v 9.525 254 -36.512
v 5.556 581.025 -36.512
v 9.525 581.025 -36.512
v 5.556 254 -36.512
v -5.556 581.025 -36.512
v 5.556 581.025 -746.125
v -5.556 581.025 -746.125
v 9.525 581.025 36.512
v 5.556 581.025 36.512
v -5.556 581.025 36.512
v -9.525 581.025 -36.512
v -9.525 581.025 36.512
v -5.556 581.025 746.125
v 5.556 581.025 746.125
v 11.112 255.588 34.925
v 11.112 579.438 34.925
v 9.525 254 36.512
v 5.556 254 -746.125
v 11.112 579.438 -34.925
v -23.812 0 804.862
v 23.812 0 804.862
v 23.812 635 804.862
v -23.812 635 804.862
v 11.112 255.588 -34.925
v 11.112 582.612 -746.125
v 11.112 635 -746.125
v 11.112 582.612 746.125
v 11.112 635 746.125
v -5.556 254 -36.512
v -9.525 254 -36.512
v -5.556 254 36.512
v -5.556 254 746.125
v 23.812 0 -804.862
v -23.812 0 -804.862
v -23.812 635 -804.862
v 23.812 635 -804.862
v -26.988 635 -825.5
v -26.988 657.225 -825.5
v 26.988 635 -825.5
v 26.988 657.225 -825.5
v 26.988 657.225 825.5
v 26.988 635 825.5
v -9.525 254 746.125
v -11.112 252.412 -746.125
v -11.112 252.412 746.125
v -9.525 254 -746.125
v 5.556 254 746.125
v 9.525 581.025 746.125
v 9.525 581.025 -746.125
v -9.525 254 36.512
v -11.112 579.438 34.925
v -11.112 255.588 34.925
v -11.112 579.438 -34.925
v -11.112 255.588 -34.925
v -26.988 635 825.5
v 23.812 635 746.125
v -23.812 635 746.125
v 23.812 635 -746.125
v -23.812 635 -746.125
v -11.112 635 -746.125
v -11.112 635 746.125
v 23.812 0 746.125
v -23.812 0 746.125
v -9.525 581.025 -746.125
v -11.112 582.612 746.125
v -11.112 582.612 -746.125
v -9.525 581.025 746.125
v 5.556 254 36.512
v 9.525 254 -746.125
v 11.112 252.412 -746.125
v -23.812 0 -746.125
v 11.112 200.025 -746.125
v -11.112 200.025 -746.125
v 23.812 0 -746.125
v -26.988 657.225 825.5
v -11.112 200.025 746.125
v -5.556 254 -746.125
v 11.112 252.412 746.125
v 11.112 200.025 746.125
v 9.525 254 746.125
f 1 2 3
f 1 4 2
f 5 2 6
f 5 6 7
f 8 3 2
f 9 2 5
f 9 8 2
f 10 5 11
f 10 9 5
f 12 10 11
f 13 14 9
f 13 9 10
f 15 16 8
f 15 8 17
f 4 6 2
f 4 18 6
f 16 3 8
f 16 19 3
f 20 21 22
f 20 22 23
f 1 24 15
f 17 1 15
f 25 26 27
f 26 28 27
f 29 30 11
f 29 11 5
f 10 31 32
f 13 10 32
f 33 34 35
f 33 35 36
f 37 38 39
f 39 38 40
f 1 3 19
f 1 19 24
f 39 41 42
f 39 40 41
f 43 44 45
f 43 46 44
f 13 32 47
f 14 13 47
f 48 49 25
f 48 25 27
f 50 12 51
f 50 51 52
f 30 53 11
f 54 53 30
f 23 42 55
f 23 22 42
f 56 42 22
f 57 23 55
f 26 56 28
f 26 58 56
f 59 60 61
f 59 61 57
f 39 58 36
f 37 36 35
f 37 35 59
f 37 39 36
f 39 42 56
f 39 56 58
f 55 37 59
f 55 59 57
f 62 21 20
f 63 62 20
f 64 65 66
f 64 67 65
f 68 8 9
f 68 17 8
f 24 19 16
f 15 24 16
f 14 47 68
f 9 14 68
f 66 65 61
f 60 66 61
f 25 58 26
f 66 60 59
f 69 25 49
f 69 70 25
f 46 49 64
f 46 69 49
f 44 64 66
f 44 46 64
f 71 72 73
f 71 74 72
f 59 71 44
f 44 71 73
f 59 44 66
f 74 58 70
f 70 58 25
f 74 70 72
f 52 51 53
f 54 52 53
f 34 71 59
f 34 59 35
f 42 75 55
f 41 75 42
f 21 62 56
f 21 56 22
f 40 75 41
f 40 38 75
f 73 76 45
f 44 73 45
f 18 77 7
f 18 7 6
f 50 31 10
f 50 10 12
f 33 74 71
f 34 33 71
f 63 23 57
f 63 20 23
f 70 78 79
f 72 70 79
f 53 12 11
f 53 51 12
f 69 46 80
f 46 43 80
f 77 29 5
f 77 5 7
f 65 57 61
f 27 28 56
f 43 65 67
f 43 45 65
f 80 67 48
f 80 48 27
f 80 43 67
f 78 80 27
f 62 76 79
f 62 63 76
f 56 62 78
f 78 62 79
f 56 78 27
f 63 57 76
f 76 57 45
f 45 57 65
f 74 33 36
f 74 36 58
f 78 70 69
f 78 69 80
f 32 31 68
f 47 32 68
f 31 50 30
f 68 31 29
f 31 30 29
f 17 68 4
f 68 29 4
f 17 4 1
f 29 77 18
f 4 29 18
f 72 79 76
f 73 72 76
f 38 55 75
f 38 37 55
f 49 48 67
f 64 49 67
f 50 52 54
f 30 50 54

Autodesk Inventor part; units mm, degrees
ref_plane "YZ Plane" through (0, 0, 0) normal (1, 0, 0) x (0, 1, 0)
ref_plane "XZ Plane" through (0, 0, 0) normal (0, 1, 0) x (-1, 0, 0)
ref_plane "XY Plane" through (0, 0, 0) normal (0, 0, 1) x (1, 0, 0)
sketch "Sketch1" plane through (0, 0, 0) normal (0, 1, 0) x (-1, 0, 0)
  line L0 (-23.8125, 804.8625) -> (23.8125, 804.8625)
  line L1 (23.8125, 804.8625) -> (23.8125, 746.125)
  line L2 (23.8125, 746.125) -> (-23.8125, 746.125)
  line L3 (-23.8125, 746.125) -> (-23.8125, 804.8625)
  line L4 (-23.8125, 804.8625) -> (23.8125, 746.125) construction
  line L5 (23.8125, 804.8625) -> (-23.8125, 746.125) construction
  line L6 (-23.8125, -746.125) -> (23.8125, -746.125)
  line L7 (23.8125, -746.125) -> (23.8125, -804.8625)
  line L8 (23.8125, -804.8625) -> (-23.8125, -804.8625)
  line L9 (-23.8125, -804.8625) -> (-23.8125, -746.125)
  line L10 (-23.8125, -746.125) -> (23.8125, -804.8625) construction
  line L11 (23.8125, -746.125) -> (-23.8125, -804.8625) construction
  line L12 (0, 746.125) -> (0, 0) construction
  line L13 (0, 0) -> (0, -746.125) construction
  point P0 (0, 775.4938)
  point P1 (0, -775.4938)
  point P2 (0, 775.4938)
  point P3 (0, -775.4938)
  dimension "d0" = 47.625
  dimension "d1" = 58.7375
  dimension "d2" = 1609.725
extrude "Extrusion1" add sketch "Sketch1" along normal blind 635
sketch "Sketch2" plane through (0, 0, 0) normal (0, 0, 1) x (1, 0, 0)
  line L0 (-26.9875, 657.225) -> (26.9875, 657.225)
  line L1 (26.9875, 657.225) -> (26.9875, 635)
  line L2 (26.9875, 635) -> (-26.9875, 635)
  line L3 (-26.9875, 635) -> (-26.9875, 657.225)
  line L4 (-26.9875, 657.225) -> (26.9875, 635) construction
  line L5 (26.9875, 657.225) -> (-26.9875, 635) construction
  line L6 (23.8125, 0) -> (-23.8125, 0) projected
  point P0 (0, 0)
  point P1 (0, 646.1125)
  point P2 (-23.8125, 635)
  point P3 (0, 646.1125)
  point P4 (0, 0)
  dimension "d5" = 53.975
  dimension "d6" = 22.225
extrude "Extrusion2" add sketch "Sketch2" along normal mid plane 1651
sketch "Sketch3" plane through (0, 0, 0) normal (0, 0, 1) x (1, 0, 0)
  line L0 (23.8125, 635) -> (-23.8125, 635) projected
  line L1 (11.1125, 581.025) -> (-11.1125, 581.025)
  line L2 (-11.1125, 581.025) -> (-11.1125, 635)
  line L3 (-11.1125, 635) -> (11.1125, 635)
  line L4 (11.1125, 635) -> (11.1125, 581.025)
  line L5 (11.1125, 581.025) -> (-11.1125, 635) construction
  line L6 (-11.1125, 581.025) -> (11.1125, 635) construction
  line L7 (11.1125, 200.025) -> (-11.1125, 200.025)
  line L8 (-11.1125, 200.025) -> (-11.1125, 254)
  line L9 (-11.1125, 254) -> (11.1125, 254)
  line L10 (11.1125, 254) -> (11.1125, 200.025)
  line L11 (11.1125, 200.025) -> (-11.1125, 254) construction
  line L12 (-11.1125, 200.025) -> (11.1125, 254) construction
  point P0 (0, 0)
  point P1 (0, 608.0125)
  point P2 (0, 608.0125)
  point P3 (0, 635)
  point P4 (0, 227.0125)
  point P5 (0, 227.0125)
  dimension "d9" = 53.975
  dimension "d10" = 22.225
  dimension "d11" = 200.025
extrude "Extrusion3" add sketch "Sketch3" against normal up to surface (1492.25 mm away) from surface at 746.125
sketch "Sketch4" plane through (-11.1125, 254, 746.125) normal (0, 1, 0) x (1, 0, 0)
  line L0 (22.225, 709.6125) -> (0, 709.6125)
  line L1 (0, 709.6125) -> (0, 782.6375)
  line L2 (0, 782.6375) -> (22.225, 782.6375)
  line L3 (22.225, 782.6375) -> (22.225, 709.6125)
  line L4 (22.225, 709.6125) -> (0, 782.6375) construction
  line L5 (0, 709.6125) -> (22.225, 782.6375) construction
  line L6 (5.5562, 0) -> (16.6687, 0)
  line L7 (16.6687, 0) -> (16.6687, 709.6125)
  line L8 (16.6687, 709.6125) -> (5.5562, 709.6125)
  line L9 (5.5562, 709.6125) -> (5.5562, 0)
  line L10 (5.5562, 0) -> (16.6687, 709.6125) construction
  line L11 (16.6687, 0) -> (5.5562, 709.6125) construction
  line L12 (-12.7, 0) -> (34.925, 0) projected
  line L13 (0, 0) -> (0, 1492.25) projected
  line L14 (5.5563, 1492.25) -> (16.6688, 1492.25)
  line L15 (16.6688, 1492.25) -> (16.6688, 782.6375)
  line L16 (16.6688, 782.6375) -> (5.5563, 782.6375)
  line L17 (5.5563, 782.6375) -> (5.5563, 1492.25)
  line L18 (5.5563, 1492.25) -> (16.6688, 782.6375) construction
  line L19 (16.6688, 1492.25) -> (5.5563, 782.6375) construction
  point P0 (11.1125, 746.125)
  point P1 (11.1125, 354.8063)
  point P2 (0, 746.125)
  point P3 (11.1125, 746.125)
  point P4 (11.1125, 1137.4438)
  point P5 (11.1125, 354.8063)
  point P6 (11.1125, 746.125)
  point P7 (11.1125, 1137.4438)
  dimension "d14" = 11.1125
  dimension "d15" = 22.225
  dimension "d16" = 73.025
extrude "Extrusion4" add sketch "Sketch4" along normal up to next separate body contours L0 L1 L2 L3 | L7 L6 L9 L0 | L2 L17 L14 L15
chamfer "Chamfer1" distance 1.5875 angle 45 8 edges at (11.1125, 581.025, 0) (11.1125, 254, 0) (-11.1125, 581.025, 0) (-11.1125, 254, 0) (11.1125, 417.5125, 36.5125) (11.1125, 417.5125, -36.5125) (-11.1125, 417.5125, -36.5125) (-11.1125, 417.5125, 36.5125)
properties part number "Footer" material "Wood (Cherry)"
